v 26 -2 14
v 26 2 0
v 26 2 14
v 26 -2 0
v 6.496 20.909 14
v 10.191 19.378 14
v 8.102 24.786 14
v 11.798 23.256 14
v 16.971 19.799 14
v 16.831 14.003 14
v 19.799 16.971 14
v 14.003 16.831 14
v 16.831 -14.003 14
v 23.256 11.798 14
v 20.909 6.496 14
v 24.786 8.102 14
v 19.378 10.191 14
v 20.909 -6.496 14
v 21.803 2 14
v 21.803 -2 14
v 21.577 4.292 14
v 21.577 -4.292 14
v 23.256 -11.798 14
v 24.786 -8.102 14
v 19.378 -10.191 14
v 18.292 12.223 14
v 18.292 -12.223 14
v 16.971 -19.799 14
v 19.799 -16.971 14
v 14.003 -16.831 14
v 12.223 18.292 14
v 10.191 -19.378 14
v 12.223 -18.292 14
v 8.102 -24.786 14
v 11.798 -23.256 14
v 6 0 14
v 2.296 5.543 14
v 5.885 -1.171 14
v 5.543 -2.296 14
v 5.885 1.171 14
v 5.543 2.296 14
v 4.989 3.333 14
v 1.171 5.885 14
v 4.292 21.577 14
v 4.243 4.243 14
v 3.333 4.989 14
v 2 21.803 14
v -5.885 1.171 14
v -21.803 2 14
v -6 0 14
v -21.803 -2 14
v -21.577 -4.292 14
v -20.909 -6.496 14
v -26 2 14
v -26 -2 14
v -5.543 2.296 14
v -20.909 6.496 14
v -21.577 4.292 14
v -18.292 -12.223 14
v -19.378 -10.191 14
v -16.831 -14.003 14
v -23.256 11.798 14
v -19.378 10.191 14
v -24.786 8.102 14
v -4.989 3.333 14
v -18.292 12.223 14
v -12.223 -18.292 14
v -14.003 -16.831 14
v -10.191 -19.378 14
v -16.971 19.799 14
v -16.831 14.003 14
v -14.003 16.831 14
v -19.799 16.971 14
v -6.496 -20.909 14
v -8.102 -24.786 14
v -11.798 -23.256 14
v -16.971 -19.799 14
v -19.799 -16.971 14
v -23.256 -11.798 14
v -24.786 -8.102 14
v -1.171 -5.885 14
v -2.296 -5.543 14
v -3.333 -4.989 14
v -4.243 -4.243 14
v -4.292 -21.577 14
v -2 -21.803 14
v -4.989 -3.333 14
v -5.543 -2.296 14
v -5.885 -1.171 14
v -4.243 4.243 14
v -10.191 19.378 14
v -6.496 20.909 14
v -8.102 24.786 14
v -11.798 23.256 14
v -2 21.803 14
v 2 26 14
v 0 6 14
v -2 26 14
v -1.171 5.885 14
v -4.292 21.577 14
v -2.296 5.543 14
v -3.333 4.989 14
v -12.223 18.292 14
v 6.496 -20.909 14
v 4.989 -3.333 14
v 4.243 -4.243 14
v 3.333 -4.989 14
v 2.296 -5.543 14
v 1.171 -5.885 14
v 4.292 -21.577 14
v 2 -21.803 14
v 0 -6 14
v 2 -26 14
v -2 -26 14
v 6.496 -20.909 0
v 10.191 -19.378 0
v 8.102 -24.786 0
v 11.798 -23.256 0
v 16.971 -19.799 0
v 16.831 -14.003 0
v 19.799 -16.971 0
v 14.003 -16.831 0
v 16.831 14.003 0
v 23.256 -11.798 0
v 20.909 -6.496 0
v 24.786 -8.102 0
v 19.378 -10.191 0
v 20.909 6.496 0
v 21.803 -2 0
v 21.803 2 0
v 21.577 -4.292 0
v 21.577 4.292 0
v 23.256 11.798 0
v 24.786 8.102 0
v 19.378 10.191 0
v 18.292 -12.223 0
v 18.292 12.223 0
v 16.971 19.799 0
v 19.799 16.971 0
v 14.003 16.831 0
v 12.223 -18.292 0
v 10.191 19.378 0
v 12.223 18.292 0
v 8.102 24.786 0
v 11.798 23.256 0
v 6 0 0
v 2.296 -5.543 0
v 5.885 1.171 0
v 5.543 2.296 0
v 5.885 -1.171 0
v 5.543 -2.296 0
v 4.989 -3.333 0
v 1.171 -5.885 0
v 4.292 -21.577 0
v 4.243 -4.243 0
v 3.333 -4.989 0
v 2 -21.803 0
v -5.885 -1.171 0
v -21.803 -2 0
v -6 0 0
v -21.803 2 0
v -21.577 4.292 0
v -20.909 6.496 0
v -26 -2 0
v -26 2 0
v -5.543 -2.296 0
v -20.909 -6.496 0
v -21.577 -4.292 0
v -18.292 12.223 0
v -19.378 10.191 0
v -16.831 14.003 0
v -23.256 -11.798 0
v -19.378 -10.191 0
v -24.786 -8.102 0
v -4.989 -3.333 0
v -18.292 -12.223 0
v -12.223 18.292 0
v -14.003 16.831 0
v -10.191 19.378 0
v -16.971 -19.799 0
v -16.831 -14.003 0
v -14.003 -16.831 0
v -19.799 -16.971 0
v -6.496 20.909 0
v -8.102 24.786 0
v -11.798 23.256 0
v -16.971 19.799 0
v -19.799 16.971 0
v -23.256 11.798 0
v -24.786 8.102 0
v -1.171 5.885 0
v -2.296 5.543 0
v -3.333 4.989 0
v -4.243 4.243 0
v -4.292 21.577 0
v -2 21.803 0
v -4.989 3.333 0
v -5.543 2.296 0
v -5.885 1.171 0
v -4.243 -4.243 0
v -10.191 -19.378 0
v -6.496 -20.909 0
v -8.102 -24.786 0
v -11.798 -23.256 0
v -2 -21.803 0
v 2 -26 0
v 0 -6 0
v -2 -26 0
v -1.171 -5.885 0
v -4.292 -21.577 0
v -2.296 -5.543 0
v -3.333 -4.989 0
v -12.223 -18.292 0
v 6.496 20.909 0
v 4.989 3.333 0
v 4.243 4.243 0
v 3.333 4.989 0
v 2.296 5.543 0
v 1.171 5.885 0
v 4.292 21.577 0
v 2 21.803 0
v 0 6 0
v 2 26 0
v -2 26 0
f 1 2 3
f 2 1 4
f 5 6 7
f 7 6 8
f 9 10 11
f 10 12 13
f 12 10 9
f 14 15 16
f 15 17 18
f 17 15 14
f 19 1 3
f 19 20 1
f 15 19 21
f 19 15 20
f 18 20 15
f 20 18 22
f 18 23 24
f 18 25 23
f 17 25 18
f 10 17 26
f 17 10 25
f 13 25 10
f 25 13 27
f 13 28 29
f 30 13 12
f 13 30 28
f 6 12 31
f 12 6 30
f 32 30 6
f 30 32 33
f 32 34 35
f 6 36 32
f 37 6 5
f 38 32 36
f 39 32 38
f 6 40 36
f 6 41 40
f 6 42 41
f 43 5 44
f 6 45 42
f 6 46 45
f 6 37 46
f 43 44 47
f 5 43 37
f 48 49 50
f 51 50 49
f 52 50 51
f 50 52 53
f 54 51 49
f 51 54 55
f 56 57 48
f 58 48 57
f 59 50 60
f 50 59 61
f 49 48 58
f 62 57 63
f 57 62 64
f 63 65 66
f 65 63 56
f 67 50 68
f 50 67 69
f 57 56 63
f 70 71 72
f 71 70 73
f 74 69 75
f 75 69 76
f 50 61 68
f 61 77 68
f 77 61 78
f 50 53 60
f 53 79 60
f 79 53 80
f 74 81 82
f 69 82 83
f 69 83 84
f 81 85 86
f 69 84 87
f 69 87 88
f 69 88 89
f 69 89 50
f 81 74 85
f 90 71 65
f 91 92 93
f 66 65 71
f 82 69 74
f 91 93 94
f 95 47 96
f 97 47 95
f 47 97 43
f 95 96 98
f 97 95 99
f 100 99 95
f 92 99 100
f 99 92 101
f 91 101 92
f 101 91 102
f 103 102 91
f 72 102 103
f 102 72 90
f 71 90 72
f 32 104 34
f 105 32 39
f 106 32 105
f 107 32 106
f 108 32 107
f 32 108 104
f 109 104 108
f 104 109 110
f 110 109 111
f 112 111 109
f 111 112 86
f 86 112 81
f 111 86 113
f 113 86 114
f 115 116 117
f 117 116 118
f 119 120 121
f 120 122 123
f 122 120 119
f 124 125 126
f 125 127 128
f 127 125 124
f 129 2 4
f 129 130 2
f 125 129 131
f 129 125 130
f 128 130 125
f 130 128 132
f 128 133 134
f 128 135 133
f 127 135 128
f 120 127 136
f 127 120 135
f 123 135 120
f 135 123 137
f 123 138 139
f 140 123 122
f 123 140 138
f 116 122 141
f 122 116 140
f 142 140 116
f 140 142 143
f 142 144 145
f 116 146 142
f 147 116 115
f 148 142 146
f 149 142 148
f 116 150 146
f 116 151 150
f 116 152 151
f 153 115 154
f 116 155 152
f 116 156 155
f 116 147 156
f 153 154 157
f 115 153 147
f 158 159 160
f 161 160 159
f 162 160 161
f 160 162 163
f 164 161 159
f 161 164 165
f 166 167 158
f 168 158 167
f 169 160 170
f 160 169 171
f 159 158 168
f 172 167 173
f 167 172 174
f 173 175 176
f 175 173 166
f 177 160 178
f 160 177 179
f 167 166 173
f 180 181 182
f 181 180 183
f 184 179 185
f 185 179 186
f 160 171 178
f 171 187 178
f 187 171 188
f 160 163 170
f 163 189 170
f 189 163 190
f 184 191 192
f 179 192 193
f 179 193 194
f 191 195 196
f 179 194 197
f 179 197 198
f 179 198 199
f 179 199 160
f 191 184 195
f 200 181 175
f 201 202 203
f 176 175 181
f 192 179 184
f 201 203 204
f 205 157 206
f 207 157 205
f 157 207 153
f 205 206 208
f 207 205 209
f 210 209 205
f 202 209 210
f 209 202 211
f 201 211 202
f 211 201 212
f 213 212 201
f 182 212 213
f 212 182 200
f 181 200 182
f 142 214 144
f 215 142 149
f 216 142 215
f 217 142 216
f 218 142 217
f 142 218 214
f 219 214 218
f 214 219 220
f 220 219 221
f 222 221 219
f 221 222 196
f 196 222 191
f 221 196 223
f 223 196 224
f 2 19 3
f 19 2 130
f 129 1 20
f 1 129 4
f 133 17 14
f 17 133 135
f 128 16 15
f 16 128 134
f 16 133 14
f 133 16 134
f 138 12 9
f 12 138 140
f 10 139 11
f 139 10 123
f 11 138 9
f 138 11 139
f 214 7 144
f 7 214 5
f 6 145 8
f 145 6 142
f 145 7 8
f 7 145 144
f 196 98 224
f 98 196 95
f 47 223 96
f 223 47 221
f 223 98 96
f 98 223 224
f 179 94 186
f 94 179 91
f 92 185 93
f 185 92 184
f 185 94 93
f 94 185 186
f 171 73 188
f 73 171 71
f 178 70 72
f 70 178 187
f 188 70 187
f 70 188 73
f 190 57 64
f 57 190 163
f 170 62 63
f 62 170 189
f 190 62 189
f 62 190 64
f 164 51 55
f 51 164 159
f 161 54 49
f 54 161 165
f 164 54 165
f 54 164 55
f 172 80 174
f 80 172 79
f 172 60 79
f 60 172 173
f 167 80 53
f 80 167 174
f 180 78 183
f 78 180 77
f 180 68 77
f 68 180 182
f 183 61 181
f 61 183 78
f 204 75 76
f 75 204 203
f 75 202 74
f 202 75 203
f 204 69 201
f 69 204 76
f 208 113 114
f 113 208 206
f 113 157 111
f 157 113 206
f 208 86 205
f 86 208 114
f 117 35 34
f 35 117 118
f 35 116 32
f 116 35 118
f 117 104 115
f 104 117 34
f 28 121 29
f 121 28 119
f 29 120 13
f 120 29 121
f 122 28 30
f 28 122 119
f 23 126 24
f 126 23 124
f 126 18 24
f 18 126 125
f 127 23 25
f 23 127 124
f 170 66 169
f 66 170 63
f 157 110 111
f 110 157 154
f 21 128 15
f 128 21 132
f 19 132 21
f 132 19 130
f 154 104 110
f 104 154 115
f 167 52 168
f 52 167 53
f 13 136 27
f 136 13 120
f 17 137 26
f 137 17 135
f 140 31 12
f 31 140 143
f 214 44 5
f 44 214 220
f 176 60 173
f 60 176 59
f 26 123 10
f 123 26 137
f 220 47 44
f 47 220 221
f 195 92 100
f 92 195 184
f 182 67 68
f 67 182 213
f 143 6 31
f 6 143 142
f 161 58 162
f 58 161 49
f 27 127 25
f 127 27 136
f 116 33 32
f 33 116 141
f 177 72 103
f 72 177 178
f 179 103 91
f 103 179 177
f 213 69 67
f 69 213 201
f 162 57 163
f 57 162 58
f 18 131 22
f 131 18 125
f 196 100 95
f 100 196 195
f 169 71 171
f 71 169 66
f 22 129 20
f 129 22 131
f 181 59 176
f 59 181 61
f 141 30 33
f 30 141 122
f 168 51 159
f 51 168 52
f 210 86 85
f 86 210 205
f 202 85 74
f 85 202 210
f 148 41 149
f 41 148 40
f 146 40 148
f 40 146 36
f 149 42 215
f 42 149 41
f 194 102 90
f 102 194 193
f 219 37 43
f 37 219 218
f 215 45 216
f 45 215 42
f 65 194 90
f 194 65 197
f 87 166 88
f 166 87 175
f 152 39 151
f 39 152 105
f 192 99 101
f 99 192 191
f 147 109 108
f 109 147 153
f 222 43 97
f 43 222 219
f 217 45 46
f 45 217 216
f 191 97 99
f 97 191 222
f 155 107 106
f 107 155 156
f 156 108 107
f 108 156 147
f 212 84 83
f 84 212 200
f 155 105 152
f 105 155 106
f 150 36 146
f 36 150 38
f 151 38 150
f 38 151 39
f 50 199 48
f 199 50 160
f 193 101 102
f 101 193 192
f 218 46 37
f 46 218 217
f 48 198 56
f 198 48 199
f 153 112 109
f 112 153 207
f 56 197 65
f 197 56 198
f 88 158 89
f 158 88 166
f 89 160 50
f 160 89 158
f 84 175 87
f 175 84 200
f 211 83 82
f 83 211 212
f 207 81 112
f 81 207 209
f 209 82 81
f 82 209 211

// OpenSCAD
$fn = 32;

// ----------------------------------------------------------------------
// Spur blank: bored gear blank
// ----------------------------------------------------------------------

// --- parameters (mm) ---
disc_r = 22;              // blank root radius
disc_t = 14;              // blank thickness
n_teeth = 16;             // stub tooth count
tooth_w = 4;              // tooth width at the root
tooth_h = 4;              // tooth height above the root
bore_r = 6;               // central bore radius

out_r = disc_r + tooth_h;  // tip radius
bbox_x = 52.0;  // measured width over the teeth
bbox_y = 52.0;  // measured depth over the teeth

difference() {
union() {
  cylinder(r = disc_r, h = disc_t);
  for (i = [0 : n_teeth - 1])
    rotate([0, 0, i * 360 / n_teeth])
      translate([disc_r - 1, -tooth_w / 2, 0])
        cube([tooth_h + 1, tooth_w, disc_t]);
}
  translate([0, 0, -1]) cylinder(r = bore_r, h = disc_t + 2);
}
